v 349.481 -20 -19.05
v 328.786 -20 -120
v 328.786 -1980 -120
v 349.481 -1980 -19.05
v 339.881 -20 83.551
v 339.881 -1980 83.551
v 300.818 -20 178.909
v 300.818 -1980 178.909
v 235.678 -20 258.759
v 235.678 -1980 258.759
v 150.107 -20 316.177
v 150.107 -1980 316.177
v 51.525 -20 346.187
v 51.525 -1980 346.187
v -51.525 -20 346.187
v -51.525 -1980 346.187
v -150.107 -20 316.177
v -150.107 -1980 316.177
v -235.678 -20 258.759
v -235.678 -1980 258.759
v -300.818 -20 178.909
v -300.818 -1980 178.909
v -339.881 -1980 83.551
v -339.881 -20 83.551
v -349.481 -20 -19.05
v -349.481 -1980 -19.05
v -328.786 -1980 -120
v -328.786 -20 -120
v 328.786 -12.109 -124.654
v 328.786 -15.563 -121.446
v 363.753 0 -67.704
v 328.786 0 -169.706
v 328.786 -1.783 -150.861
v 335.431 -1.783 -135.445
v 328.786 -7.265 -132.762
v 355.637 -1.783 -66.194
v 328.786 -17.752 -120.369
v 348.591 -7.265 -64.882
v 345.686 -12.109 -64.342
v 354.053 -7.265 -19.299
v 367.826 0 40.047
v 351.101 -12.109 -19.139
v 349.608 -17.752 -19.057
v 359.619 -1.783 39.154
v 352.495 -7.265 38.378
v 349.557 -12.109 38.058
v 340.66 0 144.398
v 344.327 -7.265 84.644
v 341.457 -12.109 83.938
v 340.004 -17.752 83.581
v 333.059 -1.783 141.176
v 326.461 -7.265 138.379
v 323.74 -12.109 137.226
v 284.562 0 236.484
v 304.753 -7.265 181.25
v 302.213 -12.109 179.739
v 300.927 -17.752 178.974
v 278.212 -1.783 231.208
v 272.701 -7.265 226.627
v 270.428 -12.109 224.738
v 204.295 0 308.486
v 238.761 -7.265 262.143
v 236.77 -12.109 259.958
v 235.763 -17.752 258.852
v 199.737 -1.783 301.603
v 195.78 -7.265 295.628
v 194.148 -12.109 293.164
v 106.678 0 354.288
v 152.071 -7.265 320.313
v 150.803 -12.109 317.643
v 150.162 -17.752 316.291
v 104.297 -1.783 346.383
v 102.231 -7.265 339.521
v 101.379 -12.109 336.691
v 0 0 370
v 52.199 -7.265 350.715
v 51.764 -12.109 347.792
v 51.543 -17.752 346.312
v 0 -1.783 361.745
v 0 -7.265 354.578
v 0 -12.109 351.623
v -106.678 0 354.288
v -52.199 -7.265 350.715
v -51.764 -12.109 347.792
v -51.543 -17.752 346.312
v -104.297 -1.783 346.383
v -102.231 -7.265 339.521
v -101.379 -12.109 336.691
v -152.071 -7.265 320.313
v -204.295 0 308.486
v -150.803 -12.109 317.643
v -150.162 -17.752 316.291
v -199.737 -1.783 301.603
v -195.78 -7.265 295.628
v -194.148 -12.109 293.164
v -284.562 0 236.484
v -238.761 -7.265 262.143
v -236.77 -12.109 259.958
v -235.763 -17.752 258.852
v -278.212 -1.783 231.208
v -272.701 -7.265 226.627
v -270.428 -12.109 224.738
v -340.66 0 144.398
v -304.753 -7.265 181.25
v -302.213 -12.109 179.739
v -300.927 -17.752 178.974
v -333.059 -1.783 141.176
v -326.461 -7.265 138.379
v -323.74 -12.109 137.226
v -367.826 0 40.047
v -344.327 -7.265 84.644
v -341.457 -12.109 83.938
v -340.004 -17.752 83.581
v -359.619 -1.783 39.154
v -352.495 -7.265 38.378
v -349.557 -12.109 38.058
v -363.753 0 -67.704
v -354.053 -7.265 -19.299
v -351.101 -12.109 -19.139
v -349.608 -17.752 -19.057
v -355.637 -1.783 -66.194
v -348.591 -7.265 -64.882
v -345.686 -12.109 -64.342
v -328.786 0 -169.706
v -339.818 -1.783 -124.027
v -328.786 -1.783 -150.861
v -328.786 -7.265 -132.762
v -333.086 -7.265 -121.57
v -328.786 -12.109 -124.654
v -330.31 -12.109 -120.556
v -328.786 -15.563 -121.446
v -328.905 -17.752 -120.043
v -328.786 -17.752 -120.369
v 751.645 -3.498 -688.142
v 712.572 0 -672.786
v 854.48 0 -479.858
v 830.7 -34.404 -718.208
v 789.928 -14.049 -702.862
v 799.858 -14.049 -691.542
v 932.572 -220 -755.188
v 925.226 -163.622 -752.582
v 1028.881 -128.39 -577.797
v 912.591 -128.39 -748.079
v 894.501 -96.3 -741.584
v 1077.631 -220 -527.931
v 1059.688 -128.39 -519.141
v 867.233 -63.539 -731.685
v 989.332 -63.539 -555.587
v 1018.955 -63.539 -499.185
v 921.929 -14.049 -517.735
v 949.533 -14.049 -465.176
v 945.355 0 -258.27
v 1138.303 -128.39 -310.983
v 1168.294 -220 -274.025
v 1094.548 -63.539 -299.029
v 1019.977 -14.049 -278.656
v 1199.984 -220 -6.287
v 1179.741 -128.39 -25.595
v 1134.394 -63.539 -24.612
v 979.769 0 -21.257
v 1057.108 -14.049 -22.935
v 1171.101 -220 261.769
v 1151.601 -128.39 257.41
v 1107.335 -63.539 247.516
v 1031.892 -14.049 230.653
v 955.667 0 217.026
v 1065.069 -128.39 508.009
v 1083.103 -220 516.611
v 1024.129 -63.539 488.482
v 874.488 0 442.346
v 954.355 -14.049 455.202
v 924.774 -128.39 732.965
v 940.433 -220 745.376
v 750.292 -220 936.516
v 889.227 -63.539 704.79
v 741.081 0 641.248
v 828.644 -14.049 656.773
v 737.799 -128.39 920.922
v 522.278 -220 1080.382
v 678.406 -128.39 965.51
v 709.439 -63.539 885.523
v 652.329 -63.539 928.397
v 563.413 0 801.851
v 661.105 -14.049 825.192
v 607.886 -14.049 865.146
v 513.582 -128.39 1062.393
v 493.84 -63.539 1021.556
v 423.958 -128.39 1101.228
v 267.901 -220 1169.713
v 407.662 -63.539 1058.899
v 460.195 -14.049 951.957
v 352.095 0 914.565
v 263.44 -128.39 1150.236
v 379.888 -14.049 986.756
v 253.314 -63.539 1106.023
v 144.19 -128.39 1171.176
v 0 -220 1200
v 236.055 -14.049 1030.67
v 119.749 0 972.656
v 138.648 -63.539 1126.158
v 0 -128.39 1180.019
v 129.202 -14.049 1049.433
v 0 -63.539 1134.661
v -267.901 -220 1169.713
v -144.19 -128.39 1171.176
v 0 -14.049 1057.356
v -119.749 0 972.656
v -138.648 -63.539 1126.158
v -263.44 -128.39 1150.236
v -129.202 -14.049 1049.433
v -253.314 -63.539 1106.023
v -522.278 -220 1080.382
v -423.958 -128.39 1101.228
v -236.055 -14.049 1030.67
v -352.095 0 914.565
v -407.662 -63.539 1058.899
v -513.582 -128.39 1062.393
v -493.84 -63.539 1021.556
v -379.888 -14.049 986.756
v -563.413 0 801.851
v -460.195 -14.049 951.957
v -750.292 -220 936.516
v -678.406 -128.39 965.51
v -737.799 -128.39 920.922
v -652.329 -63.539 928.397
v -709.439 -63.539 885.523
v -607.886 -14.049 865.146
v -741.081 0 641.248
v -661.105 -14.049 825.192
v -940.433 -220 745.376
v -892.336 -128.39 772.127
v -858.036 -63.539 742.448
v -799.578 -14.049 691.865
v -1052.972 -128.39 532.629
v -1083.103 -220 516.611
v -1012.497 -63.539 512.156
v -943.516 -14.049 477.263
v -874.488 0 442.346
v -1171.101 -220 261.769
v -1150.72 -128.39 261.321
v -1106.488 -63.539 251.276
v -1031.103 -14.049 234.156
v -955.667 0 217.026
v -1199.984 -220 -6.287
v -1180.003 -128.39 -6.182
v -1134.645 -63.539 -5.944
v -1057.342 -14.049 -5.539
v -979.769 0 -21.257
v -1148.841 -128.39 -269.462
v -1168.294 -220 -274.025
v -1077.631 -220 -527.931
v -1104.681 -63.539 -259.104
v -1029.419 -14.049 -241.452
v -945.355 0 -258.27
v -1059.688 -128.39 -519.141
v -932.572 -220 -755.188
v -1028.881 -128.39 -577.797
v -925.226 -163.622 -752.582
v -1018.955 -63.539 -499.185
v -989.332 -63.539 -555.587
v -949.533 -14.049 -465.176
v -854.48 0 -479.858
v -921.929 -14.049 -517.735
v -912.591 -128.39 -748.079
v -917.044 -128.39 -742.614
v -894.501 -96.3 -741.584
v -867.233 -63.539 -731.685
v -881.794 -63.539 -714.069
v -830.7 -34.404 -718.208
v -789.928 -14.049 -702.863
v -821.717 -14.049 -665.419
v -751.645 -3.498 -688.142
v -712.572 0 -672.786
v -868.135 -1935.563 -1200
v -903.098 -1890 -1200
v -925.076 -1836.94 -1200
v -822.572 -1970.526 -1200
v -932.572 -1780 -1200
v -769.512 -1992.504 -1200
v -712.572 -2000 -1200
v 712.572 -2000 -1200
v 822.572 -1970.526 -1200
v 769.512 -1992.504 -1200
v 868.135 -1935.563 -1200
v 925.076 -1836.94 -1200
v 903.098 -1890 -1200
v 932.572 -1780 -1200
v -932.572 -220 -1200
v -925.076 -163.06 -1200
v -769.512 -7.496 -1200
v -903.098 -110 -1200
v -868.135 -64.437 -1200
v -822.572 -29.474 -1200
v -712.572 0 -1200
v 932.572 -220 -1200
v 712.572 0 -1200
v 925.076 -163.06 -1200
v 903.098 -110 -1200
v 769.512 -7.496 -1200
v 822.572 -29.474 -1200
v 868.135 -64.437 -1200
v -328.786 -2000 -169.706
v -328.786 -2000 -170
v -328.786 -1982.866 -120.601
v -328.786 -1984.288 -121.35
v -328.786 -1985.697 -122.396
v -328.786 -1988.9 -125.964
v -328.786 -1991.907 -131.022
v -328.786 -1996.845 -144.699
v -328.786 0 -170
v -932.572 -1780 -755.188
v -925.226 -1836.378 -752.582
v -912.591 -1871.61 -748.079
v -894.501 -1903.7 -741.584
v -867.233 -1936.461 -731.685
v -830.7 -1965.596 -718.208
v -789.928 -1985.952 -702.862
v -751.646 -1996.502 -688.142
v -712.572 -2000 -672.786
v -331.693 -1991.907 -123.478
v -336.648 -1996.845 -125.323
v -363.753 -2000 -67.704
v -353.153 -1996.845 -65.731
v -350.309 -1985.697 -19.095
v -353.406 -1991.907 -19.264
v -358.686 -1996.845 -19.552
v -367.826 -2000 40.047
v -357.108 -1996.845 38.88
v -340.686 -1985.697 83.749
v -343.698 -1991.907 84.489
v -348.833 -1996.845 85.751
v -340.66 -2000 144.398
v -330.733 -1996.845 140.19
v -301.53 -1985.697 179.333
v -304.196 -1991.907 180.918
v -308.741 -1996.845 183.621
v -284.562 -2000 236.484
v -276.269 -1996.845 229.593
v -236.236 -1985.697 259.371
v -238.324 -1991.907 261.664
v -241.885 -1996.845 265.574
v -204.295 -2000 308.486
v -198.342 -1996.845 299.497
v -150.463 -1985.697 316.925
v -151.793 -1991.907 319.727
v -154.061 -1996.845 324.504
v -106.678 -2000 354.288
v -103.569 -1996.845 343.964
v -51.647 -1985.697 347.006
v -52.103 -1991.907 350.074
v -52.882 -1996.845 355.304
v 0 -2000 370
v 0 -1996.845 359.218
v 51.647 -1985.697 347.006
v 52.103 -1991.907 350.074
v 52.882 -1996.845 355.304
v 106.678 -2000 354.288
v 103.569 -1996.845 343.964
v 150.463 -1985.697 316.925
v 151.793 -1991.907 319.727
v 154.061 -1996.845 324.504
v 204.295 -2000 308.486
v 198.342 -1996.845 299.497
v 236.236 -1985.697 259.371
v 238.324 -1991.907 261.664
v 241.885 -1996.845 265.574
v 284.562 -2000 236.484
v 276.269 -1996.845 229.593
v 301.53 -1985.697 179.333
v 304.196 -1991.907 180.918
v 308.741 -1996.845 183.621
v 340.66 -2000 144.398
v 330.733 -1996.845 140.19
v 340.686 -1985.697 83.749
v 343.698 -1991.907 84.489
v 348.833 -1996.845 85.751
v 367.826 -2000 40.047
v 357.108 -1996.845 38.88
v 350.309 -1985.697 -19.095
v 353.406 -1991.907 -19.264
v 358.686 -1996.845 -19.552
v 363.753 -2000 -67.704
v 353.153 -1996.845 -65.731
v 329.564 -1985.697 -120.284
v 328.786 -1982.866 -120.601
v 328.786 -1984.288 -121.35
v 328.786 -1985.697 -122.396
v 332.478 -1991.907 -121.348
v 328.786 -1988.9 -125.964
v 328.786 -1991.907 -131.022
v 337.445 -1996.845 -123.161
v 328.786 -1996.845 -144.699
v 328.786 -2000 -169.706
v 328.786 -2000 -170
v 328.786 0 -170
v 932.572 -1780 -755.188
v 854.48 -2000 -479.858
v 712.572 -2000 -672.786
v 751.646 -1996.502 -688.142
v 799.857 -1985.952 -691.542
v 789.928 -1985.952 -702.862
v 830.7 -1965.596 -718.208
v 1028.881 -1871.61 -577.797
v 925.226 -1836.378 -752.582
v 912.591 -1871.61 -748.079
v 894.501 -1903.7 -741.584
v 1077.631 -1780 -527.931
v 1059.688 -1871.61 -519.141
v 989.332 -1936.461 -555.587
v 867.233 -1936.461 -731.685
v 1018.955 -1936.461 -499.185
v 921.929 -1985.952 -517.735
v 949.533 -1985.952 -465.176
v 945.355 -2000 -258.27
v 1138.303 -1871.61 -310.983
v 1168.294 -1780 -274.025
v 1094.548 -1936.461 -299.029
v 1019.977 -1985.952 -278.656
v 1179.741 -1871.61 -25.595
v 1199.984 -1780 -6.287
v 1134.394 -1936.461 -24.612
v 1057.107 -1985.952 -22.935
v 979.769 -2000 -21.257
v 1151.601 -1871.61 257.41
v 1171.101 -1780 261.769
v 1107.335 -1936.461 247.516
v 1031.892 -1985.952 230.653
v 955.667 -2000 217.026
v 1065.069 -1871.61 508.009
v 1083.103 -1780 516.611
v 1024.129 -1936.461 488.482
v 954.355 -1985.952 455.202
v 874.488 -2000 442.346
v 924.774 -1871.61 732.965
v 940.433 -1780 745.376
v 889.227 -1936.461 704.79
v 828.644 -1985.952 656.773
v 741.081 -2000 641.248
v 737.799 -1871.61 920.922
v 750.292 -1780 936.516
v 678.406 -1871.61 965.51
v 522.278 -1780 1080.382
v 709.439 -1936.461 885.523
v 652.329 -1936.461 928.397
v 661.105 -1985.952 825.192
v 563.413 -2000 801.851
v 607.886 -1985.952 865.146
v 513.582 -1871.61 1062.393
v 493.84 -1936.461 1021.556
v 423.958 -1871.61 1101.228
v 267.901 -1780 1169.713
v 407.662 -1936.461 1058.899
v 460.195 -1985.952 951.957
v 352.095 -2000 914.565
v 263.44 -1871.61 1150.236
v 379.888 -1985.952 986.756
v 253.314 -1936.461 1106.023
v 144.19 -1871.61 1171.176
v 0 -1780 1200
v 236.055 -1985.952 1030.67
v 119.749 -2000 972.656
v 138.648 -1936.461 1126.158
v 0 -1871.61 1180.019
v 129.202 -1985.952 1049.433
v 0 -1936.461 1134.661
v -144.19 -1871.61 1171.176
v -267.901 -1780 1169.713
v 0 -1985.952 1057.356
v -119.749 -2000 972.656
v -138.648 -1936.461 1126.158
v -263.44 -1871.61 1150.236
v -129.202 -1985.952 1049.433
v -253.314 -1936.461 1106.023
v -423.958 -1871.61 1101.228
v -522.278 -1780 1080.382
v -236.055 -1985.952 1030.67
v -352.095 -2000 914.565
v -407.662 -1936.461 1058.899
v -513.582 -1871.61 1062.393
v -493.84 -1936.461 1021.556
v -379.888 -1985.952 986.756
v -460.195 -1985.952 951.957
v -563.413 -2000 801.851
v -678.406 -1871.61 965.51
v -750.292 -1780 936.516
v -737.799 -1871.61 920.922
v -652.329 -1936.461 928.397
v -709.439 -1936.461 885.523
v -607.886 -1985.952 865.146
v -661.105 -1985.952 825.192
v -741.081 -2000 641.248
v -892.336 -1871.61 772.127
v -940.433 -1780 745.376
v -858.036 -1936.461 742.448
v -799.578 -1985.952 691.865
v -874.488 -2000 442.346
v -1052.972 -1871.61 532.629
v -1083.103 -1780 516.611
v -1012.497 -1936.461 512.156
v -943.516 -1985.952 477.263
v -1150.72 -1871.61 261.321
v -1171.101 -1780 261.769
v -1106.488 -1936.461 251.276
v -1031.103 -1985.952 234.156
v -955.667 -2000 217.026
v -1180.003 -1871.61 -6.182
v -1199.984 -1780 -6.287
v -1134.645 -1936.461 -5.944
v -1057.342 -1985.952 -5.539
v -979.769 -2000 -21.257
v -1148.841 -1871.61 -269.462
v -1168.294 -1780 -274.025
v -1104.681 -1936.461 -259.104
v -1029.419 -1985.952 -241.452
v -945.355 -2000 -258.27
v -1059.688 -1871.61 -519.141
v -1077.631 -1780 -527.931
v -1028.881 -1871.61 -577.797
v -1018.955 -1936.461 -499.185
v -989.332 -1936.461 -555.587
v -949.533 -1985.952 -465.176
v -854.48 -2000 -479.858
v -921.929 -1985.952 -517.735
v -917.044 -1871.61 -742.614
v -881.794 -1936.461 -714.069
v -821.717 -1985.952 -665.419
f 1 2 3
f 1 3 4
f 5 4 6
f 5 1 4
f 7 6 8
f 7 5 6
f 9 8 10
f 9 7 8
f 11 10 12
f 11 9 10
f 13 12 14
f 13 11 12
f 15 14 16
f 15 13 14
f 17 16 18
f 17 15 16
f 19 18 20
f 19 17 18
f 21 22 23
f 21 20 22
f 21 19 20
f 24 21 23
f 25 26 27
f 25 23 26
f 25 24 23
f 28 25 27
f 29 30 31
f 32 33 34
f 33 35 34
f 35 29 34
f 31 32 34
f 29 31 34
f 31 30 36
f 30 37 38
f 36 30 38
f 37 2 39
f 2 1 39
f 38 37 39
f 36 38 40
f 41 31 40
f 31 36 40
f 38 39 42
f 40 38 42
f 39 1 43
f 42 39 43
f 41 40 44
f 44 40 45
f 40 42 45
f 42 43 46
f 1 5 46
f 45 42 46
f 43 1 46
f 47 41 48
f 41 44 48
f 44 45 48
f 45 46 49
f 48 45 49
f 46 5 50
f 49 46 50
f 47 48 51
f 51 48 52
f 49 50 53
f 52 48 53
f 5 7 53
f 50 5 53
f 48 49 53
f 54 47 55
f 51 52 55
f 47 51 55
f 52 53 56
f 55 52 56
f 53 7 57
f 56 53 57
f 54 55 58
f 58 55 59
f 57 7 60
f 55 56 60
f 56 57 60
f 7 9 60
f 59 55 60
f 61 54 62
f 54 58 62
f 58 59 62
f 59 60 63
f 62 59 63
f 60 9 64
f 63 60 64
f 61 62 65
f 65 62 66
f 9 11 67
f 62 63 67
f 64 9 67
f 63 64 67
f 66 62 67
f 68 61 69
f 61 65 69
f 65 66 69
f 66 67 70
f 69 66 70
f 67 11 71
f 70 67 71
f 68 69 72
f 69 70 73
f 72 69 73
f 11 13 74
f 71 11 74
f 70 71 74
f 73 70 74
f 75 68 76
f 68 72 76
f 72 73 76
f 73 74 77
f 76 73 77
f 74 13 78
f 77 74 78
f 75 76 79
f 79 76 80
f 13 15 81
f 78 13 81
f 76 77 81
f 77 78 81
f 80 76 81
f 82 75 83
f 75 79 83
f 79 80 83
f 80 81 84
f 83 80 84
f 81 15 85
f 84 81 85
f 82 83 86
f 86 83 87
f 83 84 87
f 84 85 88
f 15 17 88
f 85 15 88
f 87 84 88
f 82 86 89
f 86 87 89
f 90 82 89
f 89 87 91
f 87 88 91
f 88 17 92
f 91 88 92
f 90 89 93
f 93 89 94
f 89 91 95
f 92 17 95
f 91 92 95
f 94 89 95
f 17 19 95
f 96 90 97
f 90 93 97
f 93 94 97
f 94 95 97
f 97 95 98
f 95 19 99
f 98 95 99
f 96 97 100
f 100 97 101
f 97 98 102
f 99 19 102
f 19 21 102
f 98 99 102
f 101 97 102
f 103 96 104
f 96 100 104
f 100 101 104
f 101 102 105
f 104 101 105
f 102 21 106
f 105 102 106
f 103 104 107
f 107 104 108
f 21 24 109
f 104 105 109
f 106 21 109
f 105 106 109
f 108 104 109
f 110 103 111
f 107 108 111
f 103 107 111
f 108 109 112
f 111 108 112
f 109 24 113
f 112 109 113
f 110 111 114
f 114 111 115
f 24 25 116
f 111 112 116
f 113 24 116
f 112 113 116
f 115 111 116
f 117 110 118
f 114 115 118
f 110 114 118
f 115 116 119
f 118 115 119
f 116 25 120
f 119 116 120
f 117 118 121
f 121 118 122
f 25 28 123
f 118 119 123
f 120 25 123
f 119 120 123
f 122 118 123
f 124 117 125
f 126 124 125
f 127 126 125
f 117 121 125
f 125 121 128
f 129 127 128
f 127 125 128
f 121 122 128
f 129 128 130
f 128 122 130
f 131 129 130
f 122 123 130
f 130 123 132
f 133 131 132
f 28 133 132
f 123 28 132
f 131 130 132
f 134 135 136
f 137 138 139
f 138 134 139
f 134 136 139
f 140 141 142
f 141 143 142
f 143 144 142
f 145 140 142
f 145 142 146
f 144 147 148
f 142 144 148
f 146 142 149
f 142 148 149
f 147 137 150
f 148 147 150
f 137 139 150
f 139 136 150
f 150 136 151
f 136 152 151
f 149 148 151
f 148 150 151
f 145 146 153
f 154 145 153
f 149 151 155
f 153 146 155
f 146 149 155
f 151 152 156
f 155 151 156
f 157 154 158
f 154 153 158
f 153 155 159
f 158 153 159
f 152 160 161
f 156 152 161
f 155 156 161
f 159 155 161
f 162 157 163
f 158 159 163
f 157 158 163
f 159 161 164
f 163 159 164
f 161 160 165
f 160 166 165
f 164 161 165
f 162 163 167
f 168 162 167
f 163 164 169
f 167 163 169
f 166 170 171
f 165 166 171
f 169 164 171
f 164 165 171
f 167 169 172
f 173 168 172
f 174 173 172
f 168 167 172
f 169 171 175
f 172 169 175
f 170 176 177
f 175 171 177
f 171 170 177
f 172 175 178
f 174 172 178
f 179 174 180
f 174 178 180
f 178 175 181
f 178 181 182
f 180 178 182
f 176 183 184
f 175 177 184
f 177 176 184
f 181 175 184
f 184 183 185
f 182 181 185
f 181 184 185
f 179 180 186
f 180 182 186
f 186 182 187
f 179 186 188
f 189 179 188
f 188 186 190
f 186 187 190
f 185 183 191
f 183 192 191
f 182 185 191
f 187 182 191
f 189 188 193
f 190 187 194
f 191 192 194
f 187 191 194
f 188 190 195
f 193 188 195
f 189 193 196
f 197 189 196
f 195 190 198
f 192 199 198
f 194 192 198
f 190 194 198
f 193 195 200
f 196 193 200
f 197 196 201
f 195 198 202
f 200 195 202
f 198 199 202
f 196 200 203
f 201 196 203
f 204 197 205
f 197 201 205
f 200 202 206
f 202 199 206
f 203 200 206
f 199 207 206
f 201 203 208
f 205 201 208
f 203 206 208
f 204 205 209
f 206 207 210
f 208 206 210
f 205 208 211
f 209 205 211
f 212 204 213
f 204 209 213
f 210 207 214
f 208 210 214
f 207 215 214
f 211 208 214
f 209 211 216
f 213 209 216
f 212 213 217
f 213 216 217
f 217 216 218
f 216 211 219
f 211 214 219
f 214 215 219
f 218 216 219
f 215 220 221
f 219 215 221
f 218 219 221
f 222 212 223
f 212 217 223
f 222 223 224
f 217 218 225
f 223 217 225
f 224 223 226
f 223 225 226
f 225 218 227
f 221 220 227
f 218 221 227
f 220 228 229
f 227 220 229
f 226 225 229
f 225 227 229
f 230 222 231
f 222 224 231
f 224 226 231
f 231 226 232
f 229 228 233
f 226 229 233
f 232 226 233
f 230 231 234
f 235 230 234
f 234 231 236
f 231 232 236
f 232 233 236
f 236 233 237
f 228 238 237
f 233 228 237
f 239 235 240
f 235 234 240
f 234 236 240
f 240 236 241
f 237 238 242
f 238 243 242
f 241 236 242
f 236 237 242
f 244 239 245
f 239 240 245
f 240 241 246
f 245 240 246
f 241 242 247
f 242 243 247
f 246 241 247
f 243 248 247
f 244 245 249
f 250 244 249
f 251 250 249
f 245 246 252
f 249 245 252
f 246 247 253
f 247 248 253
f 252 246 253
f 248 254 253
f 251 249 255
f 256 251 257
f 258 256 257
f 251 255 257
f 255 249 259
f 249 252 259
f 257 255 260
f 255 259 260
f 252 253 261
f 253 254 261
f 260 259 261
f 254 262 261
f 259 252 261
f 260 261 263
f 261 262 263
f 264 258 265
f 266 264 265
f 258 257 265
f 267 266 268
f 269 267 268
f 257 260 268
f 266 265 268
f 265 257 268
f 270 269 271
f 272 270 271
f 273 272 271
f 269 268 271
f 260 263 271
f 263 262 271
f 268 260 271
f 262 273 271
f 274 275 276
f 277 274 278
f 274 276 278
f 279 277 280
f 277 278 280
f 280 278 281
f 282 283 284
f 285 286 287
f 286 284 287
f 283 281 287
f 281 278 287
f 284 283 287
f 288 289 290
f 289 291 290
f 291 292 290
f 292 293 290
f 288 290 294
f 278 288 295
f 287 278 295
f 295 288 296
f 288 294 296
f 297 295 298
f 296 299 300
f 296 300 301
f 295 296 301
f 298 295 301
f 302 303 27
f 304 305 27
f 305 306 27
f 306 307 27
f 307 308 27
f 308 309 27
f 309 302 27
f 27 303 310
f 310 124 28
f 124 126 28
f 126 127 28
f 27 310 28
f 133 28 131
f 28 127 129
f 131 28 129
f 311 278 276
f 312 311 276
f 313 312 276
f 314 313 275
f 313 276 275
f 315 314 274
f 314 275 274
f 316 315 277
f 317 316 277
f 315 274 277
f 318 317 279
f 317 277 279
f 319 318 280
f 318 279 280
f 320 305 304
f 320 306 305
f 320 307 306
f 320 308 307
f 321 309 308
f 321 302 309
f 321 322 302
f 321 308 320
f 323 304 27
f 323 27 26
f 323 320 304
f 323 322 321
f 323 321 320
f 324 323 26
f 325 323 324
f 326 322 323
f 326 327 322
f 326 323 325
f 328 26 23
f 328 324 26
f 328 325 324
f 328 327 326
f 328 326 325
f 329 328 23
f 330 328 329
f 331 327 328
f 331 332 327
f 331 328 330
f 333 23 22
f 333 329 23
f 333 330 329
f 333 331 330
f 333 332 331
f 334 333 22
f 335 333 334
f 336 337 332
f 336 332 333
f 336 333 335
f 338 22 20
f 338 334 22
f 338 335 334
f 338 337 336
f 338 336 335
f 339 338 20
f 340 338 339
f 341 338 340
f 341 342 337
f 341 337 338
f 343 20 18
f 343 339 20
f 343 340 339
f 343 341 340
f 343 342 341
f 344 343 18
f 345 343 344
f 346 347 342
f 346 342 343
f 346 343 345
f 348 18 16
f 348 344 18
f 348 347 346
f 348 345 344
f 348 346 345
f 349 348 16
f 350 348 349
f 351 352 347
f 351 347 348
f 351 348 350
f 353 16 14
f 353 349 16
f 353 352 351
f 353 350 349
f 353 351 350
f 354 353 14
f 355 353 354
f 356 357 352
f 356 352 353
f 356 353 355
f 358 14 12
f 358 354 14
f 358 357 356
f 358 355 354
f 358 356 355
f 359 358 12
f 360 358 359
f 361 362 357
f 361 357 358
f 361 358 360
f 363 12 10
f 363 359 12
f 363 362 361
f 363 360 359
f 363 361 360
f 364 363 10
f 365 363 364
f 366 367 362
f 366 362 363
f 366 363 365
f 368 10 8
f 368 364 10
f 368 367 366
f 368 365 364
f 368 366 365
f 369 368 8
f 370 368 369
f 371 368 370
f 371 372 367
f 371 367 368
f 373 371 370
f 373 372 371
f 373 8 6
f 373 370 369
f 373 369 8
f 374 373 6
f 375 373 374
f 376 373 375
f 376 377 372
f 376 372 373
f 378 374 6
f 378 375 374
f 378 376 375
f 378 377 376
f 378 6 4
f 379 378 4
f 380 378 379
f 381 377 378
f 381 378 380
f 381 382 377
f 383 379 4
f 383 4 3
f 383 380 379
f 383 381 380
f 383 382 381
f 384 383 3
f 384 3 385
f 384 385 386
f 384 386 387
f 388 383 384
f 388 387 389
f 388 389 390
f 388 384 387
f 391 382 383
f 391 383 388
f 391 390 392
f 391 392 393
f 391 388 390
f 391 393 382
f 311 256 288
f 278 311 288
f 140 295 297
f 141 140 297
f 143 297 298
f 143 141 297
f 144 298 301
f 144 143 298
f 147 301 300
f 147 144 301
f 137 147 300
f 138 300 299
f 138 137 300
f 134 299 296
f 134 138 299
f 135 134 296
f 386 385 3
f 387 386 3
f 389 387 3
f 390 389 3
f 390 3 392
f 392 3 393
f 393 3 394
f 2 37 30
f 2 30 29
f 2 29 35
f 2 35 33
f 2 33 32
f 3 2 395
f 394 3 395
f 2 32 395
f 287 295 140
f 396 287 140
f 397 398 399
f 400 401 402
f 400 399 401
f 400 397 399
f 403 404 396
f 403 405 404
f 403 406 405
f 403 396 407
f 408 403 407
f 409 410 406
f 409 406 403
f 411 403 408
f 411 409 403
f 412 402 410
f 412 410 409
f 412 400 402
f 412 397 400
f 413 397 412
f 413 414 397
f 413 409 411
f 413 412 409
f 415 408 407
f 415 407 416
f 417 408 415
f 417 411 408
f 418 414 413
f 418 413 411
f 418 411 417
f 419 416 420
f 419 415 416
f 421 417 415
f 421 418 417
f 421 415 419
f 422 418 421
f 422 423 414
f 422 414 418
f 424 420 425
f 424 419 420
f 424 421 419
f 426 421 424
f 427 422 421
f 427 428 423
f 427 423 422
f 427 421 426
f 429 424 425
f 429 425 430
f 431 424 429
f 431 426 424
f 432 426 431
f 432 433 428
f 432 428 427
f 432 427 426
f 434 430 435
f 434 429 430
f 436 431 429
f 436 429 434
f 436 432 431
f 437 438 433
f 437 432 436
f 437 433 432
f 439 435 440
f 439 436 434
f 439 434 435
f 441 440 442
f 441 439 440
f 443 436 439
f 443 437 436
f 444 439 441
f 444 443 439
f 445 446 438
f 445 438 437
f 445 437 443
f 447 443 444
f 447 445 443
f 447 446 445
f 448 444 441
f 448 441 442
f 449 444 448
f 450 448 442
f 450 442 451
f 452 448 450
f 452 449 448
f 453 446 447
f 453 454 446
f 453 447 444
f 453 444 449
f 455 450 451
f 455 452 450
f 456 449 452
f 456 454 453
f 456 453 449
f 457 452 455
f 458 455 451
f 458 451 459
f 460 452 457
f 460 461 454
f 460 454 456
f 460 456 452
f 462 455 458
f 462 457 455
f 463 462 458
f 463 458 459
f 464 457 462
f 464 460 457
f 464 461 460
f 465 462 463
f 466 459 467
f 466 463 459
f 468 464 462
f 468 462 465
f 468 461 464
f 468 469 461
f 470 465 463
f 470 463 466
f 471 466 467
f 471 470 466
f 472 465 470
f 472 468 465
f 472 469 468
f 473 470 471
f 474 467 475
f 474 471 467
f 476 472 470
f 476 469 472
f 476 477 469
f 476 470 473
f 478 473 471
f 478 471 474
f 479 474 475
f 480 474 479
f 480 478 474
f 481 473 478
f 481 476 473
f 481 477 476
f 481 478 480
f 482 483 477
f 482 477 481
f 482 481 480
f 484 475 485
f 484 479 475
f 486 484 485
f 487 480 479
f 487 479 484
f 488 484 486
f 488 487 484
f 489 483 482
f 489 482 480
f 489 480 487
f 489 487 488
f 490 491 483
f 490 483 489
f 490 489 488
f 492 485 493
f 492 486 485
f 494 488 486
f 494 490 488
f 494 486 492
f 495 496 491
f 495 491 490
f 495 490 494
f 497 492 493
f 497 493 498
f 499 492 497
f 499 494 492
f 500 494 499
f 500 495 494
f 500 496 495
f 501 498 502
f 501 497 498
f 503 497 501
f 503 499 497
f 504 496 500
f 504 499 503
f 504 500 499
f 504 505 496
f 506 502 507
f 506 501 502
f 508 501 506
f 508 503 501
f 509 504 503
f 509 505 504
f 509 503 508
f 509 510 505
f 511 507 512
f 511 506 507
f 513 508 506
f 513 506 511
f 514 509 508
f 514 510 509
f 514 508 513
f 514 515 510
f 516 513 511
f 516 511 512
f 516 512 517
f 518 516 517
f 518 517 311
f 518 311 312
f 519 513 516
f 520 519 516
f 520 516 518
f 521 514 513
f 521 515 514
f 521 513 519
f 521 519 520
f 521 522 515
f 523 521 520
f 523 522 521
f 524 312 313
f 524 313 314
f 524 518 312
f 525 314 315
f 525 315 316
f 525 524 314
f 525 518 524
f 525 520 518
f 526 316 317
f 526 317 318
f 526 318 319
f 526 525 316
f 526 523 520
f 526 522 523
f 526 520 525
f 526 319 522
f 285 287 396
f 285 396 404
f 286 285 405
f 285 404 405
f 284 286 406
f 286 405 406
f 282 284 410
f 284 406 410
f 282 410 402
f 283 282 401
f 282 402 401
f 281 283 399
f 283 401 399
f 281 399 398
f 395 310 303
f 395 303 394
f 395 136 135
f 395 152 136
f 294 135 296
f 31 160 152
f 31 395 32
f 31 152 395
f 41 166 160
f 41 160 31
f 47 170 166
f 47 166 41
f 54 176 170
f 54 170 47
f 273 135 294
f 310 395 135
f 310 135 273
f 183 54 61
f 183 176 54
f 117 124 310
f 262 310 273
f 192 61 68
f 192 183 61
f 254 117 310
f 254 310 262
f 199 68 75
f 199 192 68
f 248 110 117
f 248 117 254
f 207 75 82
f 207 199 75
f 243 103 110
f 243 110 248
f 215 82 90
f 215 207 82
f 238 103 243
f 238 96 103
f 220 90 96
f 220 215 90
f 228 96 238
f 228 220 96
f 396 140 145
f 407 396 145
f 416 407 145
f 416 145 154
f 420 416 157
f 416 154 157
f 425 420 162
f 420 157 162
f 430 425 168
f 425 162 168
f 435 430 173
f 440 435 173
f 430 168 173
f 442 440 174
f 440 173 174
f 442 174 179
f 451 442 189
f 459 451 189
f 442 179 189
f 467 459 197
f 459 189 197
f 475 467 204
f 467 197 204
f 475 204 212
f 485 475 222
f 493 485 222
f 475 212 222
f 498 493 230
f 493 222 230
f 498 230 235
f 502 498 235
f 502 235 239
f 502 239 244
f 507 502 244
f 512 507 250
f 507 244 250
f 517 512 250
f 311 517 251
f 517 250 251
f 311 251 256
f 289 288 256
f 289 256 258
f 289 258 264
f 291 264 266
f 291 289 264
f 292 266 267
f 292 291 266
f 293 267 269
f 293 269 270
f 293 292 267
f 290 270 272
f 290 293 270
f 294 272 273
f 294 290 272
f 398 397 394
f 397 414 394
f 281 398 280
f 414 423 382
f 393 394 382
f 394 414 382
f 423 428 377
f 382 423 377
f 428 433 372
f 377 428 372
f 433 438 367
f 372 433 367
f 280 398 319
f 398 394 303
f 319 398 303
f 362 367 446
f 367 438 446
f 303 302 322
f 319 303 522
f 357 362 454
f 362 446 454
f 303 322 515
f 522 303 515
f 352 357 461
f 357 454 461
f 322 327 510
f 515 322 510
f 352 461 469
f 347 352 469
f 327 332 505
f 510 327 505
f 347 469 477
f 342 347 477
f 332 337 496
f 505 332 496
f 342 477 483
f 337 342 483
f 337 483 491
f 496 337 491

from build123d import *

# Parameters (mm, degrees)
F0_R     = 350
F1_DEPTH = 2000
F2_R     = 220
F4_DEPTH = 2000.001
F6_DEPTH = 2000
F7_R     = 20


with BuildPart() as f1:
    # F0 (on Front) → F1 (new body)
    with BuildSketch(Plane.XZ):
        with BuildLine():
            Line((932.57199, -1200), (932.57199, -755.188376))
            ThreePointArc((932.57199, -755.188376), (0, 1200), (-932.57199, -755.188376))
            Line((-932.57199, -755.188376), (-932.57199, -1200))
            Line((-932.57199, -1200), (0, -1200))
            Line((0, -1200), (932.57199, -1200))
        make_face()
        Circle(F0_R, mode=Mode.SUBTRACT)
    extrude(amount=F1_DEPTH)

    # F2
    f2_edges = [f1.edges().sort_by_distance(p)[0] for p in [
        (0, -2000, 1200),
        (0, 0, 1200),
        (932.57199, -2000, -977.594188),
        (-932.57199, -2000, -977.594188),
        (932.57199, 0, -977.594188),
        (-932.57199, 0, -977.594188),
    ]]
    fillet(f2_edges, radius=F2_R)

    # F3 (on face) → F4 (cut, through all)
    with BuildSketch(Plane(origin=(0, 0, 0), x_dir=(-1, 0, 0), z_dir=(0, 1, 0))):
        Polygon((328.785644, -120), (0, -120), (-328.785644, -120), (-328.785644, -170), (0, -170), (328.785644, -170), align=None)
    extrude(amount=-F4_DEPTH, mode=Mode.SUBTRACT)

    # F5 (on face) → F6 (join, through all)
    with BuildSketch(Plane(origin=(0, 0, 0), x_dir=(-1, 0, 0), z_dir=(0, 1, 0))):
        Polygon((305.941171, -170), (-305.941171, -170), (-287.25341, -350), (0, -350), (287.25341, -350), align=None)
    extrude(amount=-F6_DEPTH)

    # F7
    f7_edges = [f1.edges().sort_by_distance(p)[0] for p in [
        (0, 0, 350),
        (0, -2000, 350),
    ]]
    fillet(f7_edges, radius=F7_R)


solid = f1.part
